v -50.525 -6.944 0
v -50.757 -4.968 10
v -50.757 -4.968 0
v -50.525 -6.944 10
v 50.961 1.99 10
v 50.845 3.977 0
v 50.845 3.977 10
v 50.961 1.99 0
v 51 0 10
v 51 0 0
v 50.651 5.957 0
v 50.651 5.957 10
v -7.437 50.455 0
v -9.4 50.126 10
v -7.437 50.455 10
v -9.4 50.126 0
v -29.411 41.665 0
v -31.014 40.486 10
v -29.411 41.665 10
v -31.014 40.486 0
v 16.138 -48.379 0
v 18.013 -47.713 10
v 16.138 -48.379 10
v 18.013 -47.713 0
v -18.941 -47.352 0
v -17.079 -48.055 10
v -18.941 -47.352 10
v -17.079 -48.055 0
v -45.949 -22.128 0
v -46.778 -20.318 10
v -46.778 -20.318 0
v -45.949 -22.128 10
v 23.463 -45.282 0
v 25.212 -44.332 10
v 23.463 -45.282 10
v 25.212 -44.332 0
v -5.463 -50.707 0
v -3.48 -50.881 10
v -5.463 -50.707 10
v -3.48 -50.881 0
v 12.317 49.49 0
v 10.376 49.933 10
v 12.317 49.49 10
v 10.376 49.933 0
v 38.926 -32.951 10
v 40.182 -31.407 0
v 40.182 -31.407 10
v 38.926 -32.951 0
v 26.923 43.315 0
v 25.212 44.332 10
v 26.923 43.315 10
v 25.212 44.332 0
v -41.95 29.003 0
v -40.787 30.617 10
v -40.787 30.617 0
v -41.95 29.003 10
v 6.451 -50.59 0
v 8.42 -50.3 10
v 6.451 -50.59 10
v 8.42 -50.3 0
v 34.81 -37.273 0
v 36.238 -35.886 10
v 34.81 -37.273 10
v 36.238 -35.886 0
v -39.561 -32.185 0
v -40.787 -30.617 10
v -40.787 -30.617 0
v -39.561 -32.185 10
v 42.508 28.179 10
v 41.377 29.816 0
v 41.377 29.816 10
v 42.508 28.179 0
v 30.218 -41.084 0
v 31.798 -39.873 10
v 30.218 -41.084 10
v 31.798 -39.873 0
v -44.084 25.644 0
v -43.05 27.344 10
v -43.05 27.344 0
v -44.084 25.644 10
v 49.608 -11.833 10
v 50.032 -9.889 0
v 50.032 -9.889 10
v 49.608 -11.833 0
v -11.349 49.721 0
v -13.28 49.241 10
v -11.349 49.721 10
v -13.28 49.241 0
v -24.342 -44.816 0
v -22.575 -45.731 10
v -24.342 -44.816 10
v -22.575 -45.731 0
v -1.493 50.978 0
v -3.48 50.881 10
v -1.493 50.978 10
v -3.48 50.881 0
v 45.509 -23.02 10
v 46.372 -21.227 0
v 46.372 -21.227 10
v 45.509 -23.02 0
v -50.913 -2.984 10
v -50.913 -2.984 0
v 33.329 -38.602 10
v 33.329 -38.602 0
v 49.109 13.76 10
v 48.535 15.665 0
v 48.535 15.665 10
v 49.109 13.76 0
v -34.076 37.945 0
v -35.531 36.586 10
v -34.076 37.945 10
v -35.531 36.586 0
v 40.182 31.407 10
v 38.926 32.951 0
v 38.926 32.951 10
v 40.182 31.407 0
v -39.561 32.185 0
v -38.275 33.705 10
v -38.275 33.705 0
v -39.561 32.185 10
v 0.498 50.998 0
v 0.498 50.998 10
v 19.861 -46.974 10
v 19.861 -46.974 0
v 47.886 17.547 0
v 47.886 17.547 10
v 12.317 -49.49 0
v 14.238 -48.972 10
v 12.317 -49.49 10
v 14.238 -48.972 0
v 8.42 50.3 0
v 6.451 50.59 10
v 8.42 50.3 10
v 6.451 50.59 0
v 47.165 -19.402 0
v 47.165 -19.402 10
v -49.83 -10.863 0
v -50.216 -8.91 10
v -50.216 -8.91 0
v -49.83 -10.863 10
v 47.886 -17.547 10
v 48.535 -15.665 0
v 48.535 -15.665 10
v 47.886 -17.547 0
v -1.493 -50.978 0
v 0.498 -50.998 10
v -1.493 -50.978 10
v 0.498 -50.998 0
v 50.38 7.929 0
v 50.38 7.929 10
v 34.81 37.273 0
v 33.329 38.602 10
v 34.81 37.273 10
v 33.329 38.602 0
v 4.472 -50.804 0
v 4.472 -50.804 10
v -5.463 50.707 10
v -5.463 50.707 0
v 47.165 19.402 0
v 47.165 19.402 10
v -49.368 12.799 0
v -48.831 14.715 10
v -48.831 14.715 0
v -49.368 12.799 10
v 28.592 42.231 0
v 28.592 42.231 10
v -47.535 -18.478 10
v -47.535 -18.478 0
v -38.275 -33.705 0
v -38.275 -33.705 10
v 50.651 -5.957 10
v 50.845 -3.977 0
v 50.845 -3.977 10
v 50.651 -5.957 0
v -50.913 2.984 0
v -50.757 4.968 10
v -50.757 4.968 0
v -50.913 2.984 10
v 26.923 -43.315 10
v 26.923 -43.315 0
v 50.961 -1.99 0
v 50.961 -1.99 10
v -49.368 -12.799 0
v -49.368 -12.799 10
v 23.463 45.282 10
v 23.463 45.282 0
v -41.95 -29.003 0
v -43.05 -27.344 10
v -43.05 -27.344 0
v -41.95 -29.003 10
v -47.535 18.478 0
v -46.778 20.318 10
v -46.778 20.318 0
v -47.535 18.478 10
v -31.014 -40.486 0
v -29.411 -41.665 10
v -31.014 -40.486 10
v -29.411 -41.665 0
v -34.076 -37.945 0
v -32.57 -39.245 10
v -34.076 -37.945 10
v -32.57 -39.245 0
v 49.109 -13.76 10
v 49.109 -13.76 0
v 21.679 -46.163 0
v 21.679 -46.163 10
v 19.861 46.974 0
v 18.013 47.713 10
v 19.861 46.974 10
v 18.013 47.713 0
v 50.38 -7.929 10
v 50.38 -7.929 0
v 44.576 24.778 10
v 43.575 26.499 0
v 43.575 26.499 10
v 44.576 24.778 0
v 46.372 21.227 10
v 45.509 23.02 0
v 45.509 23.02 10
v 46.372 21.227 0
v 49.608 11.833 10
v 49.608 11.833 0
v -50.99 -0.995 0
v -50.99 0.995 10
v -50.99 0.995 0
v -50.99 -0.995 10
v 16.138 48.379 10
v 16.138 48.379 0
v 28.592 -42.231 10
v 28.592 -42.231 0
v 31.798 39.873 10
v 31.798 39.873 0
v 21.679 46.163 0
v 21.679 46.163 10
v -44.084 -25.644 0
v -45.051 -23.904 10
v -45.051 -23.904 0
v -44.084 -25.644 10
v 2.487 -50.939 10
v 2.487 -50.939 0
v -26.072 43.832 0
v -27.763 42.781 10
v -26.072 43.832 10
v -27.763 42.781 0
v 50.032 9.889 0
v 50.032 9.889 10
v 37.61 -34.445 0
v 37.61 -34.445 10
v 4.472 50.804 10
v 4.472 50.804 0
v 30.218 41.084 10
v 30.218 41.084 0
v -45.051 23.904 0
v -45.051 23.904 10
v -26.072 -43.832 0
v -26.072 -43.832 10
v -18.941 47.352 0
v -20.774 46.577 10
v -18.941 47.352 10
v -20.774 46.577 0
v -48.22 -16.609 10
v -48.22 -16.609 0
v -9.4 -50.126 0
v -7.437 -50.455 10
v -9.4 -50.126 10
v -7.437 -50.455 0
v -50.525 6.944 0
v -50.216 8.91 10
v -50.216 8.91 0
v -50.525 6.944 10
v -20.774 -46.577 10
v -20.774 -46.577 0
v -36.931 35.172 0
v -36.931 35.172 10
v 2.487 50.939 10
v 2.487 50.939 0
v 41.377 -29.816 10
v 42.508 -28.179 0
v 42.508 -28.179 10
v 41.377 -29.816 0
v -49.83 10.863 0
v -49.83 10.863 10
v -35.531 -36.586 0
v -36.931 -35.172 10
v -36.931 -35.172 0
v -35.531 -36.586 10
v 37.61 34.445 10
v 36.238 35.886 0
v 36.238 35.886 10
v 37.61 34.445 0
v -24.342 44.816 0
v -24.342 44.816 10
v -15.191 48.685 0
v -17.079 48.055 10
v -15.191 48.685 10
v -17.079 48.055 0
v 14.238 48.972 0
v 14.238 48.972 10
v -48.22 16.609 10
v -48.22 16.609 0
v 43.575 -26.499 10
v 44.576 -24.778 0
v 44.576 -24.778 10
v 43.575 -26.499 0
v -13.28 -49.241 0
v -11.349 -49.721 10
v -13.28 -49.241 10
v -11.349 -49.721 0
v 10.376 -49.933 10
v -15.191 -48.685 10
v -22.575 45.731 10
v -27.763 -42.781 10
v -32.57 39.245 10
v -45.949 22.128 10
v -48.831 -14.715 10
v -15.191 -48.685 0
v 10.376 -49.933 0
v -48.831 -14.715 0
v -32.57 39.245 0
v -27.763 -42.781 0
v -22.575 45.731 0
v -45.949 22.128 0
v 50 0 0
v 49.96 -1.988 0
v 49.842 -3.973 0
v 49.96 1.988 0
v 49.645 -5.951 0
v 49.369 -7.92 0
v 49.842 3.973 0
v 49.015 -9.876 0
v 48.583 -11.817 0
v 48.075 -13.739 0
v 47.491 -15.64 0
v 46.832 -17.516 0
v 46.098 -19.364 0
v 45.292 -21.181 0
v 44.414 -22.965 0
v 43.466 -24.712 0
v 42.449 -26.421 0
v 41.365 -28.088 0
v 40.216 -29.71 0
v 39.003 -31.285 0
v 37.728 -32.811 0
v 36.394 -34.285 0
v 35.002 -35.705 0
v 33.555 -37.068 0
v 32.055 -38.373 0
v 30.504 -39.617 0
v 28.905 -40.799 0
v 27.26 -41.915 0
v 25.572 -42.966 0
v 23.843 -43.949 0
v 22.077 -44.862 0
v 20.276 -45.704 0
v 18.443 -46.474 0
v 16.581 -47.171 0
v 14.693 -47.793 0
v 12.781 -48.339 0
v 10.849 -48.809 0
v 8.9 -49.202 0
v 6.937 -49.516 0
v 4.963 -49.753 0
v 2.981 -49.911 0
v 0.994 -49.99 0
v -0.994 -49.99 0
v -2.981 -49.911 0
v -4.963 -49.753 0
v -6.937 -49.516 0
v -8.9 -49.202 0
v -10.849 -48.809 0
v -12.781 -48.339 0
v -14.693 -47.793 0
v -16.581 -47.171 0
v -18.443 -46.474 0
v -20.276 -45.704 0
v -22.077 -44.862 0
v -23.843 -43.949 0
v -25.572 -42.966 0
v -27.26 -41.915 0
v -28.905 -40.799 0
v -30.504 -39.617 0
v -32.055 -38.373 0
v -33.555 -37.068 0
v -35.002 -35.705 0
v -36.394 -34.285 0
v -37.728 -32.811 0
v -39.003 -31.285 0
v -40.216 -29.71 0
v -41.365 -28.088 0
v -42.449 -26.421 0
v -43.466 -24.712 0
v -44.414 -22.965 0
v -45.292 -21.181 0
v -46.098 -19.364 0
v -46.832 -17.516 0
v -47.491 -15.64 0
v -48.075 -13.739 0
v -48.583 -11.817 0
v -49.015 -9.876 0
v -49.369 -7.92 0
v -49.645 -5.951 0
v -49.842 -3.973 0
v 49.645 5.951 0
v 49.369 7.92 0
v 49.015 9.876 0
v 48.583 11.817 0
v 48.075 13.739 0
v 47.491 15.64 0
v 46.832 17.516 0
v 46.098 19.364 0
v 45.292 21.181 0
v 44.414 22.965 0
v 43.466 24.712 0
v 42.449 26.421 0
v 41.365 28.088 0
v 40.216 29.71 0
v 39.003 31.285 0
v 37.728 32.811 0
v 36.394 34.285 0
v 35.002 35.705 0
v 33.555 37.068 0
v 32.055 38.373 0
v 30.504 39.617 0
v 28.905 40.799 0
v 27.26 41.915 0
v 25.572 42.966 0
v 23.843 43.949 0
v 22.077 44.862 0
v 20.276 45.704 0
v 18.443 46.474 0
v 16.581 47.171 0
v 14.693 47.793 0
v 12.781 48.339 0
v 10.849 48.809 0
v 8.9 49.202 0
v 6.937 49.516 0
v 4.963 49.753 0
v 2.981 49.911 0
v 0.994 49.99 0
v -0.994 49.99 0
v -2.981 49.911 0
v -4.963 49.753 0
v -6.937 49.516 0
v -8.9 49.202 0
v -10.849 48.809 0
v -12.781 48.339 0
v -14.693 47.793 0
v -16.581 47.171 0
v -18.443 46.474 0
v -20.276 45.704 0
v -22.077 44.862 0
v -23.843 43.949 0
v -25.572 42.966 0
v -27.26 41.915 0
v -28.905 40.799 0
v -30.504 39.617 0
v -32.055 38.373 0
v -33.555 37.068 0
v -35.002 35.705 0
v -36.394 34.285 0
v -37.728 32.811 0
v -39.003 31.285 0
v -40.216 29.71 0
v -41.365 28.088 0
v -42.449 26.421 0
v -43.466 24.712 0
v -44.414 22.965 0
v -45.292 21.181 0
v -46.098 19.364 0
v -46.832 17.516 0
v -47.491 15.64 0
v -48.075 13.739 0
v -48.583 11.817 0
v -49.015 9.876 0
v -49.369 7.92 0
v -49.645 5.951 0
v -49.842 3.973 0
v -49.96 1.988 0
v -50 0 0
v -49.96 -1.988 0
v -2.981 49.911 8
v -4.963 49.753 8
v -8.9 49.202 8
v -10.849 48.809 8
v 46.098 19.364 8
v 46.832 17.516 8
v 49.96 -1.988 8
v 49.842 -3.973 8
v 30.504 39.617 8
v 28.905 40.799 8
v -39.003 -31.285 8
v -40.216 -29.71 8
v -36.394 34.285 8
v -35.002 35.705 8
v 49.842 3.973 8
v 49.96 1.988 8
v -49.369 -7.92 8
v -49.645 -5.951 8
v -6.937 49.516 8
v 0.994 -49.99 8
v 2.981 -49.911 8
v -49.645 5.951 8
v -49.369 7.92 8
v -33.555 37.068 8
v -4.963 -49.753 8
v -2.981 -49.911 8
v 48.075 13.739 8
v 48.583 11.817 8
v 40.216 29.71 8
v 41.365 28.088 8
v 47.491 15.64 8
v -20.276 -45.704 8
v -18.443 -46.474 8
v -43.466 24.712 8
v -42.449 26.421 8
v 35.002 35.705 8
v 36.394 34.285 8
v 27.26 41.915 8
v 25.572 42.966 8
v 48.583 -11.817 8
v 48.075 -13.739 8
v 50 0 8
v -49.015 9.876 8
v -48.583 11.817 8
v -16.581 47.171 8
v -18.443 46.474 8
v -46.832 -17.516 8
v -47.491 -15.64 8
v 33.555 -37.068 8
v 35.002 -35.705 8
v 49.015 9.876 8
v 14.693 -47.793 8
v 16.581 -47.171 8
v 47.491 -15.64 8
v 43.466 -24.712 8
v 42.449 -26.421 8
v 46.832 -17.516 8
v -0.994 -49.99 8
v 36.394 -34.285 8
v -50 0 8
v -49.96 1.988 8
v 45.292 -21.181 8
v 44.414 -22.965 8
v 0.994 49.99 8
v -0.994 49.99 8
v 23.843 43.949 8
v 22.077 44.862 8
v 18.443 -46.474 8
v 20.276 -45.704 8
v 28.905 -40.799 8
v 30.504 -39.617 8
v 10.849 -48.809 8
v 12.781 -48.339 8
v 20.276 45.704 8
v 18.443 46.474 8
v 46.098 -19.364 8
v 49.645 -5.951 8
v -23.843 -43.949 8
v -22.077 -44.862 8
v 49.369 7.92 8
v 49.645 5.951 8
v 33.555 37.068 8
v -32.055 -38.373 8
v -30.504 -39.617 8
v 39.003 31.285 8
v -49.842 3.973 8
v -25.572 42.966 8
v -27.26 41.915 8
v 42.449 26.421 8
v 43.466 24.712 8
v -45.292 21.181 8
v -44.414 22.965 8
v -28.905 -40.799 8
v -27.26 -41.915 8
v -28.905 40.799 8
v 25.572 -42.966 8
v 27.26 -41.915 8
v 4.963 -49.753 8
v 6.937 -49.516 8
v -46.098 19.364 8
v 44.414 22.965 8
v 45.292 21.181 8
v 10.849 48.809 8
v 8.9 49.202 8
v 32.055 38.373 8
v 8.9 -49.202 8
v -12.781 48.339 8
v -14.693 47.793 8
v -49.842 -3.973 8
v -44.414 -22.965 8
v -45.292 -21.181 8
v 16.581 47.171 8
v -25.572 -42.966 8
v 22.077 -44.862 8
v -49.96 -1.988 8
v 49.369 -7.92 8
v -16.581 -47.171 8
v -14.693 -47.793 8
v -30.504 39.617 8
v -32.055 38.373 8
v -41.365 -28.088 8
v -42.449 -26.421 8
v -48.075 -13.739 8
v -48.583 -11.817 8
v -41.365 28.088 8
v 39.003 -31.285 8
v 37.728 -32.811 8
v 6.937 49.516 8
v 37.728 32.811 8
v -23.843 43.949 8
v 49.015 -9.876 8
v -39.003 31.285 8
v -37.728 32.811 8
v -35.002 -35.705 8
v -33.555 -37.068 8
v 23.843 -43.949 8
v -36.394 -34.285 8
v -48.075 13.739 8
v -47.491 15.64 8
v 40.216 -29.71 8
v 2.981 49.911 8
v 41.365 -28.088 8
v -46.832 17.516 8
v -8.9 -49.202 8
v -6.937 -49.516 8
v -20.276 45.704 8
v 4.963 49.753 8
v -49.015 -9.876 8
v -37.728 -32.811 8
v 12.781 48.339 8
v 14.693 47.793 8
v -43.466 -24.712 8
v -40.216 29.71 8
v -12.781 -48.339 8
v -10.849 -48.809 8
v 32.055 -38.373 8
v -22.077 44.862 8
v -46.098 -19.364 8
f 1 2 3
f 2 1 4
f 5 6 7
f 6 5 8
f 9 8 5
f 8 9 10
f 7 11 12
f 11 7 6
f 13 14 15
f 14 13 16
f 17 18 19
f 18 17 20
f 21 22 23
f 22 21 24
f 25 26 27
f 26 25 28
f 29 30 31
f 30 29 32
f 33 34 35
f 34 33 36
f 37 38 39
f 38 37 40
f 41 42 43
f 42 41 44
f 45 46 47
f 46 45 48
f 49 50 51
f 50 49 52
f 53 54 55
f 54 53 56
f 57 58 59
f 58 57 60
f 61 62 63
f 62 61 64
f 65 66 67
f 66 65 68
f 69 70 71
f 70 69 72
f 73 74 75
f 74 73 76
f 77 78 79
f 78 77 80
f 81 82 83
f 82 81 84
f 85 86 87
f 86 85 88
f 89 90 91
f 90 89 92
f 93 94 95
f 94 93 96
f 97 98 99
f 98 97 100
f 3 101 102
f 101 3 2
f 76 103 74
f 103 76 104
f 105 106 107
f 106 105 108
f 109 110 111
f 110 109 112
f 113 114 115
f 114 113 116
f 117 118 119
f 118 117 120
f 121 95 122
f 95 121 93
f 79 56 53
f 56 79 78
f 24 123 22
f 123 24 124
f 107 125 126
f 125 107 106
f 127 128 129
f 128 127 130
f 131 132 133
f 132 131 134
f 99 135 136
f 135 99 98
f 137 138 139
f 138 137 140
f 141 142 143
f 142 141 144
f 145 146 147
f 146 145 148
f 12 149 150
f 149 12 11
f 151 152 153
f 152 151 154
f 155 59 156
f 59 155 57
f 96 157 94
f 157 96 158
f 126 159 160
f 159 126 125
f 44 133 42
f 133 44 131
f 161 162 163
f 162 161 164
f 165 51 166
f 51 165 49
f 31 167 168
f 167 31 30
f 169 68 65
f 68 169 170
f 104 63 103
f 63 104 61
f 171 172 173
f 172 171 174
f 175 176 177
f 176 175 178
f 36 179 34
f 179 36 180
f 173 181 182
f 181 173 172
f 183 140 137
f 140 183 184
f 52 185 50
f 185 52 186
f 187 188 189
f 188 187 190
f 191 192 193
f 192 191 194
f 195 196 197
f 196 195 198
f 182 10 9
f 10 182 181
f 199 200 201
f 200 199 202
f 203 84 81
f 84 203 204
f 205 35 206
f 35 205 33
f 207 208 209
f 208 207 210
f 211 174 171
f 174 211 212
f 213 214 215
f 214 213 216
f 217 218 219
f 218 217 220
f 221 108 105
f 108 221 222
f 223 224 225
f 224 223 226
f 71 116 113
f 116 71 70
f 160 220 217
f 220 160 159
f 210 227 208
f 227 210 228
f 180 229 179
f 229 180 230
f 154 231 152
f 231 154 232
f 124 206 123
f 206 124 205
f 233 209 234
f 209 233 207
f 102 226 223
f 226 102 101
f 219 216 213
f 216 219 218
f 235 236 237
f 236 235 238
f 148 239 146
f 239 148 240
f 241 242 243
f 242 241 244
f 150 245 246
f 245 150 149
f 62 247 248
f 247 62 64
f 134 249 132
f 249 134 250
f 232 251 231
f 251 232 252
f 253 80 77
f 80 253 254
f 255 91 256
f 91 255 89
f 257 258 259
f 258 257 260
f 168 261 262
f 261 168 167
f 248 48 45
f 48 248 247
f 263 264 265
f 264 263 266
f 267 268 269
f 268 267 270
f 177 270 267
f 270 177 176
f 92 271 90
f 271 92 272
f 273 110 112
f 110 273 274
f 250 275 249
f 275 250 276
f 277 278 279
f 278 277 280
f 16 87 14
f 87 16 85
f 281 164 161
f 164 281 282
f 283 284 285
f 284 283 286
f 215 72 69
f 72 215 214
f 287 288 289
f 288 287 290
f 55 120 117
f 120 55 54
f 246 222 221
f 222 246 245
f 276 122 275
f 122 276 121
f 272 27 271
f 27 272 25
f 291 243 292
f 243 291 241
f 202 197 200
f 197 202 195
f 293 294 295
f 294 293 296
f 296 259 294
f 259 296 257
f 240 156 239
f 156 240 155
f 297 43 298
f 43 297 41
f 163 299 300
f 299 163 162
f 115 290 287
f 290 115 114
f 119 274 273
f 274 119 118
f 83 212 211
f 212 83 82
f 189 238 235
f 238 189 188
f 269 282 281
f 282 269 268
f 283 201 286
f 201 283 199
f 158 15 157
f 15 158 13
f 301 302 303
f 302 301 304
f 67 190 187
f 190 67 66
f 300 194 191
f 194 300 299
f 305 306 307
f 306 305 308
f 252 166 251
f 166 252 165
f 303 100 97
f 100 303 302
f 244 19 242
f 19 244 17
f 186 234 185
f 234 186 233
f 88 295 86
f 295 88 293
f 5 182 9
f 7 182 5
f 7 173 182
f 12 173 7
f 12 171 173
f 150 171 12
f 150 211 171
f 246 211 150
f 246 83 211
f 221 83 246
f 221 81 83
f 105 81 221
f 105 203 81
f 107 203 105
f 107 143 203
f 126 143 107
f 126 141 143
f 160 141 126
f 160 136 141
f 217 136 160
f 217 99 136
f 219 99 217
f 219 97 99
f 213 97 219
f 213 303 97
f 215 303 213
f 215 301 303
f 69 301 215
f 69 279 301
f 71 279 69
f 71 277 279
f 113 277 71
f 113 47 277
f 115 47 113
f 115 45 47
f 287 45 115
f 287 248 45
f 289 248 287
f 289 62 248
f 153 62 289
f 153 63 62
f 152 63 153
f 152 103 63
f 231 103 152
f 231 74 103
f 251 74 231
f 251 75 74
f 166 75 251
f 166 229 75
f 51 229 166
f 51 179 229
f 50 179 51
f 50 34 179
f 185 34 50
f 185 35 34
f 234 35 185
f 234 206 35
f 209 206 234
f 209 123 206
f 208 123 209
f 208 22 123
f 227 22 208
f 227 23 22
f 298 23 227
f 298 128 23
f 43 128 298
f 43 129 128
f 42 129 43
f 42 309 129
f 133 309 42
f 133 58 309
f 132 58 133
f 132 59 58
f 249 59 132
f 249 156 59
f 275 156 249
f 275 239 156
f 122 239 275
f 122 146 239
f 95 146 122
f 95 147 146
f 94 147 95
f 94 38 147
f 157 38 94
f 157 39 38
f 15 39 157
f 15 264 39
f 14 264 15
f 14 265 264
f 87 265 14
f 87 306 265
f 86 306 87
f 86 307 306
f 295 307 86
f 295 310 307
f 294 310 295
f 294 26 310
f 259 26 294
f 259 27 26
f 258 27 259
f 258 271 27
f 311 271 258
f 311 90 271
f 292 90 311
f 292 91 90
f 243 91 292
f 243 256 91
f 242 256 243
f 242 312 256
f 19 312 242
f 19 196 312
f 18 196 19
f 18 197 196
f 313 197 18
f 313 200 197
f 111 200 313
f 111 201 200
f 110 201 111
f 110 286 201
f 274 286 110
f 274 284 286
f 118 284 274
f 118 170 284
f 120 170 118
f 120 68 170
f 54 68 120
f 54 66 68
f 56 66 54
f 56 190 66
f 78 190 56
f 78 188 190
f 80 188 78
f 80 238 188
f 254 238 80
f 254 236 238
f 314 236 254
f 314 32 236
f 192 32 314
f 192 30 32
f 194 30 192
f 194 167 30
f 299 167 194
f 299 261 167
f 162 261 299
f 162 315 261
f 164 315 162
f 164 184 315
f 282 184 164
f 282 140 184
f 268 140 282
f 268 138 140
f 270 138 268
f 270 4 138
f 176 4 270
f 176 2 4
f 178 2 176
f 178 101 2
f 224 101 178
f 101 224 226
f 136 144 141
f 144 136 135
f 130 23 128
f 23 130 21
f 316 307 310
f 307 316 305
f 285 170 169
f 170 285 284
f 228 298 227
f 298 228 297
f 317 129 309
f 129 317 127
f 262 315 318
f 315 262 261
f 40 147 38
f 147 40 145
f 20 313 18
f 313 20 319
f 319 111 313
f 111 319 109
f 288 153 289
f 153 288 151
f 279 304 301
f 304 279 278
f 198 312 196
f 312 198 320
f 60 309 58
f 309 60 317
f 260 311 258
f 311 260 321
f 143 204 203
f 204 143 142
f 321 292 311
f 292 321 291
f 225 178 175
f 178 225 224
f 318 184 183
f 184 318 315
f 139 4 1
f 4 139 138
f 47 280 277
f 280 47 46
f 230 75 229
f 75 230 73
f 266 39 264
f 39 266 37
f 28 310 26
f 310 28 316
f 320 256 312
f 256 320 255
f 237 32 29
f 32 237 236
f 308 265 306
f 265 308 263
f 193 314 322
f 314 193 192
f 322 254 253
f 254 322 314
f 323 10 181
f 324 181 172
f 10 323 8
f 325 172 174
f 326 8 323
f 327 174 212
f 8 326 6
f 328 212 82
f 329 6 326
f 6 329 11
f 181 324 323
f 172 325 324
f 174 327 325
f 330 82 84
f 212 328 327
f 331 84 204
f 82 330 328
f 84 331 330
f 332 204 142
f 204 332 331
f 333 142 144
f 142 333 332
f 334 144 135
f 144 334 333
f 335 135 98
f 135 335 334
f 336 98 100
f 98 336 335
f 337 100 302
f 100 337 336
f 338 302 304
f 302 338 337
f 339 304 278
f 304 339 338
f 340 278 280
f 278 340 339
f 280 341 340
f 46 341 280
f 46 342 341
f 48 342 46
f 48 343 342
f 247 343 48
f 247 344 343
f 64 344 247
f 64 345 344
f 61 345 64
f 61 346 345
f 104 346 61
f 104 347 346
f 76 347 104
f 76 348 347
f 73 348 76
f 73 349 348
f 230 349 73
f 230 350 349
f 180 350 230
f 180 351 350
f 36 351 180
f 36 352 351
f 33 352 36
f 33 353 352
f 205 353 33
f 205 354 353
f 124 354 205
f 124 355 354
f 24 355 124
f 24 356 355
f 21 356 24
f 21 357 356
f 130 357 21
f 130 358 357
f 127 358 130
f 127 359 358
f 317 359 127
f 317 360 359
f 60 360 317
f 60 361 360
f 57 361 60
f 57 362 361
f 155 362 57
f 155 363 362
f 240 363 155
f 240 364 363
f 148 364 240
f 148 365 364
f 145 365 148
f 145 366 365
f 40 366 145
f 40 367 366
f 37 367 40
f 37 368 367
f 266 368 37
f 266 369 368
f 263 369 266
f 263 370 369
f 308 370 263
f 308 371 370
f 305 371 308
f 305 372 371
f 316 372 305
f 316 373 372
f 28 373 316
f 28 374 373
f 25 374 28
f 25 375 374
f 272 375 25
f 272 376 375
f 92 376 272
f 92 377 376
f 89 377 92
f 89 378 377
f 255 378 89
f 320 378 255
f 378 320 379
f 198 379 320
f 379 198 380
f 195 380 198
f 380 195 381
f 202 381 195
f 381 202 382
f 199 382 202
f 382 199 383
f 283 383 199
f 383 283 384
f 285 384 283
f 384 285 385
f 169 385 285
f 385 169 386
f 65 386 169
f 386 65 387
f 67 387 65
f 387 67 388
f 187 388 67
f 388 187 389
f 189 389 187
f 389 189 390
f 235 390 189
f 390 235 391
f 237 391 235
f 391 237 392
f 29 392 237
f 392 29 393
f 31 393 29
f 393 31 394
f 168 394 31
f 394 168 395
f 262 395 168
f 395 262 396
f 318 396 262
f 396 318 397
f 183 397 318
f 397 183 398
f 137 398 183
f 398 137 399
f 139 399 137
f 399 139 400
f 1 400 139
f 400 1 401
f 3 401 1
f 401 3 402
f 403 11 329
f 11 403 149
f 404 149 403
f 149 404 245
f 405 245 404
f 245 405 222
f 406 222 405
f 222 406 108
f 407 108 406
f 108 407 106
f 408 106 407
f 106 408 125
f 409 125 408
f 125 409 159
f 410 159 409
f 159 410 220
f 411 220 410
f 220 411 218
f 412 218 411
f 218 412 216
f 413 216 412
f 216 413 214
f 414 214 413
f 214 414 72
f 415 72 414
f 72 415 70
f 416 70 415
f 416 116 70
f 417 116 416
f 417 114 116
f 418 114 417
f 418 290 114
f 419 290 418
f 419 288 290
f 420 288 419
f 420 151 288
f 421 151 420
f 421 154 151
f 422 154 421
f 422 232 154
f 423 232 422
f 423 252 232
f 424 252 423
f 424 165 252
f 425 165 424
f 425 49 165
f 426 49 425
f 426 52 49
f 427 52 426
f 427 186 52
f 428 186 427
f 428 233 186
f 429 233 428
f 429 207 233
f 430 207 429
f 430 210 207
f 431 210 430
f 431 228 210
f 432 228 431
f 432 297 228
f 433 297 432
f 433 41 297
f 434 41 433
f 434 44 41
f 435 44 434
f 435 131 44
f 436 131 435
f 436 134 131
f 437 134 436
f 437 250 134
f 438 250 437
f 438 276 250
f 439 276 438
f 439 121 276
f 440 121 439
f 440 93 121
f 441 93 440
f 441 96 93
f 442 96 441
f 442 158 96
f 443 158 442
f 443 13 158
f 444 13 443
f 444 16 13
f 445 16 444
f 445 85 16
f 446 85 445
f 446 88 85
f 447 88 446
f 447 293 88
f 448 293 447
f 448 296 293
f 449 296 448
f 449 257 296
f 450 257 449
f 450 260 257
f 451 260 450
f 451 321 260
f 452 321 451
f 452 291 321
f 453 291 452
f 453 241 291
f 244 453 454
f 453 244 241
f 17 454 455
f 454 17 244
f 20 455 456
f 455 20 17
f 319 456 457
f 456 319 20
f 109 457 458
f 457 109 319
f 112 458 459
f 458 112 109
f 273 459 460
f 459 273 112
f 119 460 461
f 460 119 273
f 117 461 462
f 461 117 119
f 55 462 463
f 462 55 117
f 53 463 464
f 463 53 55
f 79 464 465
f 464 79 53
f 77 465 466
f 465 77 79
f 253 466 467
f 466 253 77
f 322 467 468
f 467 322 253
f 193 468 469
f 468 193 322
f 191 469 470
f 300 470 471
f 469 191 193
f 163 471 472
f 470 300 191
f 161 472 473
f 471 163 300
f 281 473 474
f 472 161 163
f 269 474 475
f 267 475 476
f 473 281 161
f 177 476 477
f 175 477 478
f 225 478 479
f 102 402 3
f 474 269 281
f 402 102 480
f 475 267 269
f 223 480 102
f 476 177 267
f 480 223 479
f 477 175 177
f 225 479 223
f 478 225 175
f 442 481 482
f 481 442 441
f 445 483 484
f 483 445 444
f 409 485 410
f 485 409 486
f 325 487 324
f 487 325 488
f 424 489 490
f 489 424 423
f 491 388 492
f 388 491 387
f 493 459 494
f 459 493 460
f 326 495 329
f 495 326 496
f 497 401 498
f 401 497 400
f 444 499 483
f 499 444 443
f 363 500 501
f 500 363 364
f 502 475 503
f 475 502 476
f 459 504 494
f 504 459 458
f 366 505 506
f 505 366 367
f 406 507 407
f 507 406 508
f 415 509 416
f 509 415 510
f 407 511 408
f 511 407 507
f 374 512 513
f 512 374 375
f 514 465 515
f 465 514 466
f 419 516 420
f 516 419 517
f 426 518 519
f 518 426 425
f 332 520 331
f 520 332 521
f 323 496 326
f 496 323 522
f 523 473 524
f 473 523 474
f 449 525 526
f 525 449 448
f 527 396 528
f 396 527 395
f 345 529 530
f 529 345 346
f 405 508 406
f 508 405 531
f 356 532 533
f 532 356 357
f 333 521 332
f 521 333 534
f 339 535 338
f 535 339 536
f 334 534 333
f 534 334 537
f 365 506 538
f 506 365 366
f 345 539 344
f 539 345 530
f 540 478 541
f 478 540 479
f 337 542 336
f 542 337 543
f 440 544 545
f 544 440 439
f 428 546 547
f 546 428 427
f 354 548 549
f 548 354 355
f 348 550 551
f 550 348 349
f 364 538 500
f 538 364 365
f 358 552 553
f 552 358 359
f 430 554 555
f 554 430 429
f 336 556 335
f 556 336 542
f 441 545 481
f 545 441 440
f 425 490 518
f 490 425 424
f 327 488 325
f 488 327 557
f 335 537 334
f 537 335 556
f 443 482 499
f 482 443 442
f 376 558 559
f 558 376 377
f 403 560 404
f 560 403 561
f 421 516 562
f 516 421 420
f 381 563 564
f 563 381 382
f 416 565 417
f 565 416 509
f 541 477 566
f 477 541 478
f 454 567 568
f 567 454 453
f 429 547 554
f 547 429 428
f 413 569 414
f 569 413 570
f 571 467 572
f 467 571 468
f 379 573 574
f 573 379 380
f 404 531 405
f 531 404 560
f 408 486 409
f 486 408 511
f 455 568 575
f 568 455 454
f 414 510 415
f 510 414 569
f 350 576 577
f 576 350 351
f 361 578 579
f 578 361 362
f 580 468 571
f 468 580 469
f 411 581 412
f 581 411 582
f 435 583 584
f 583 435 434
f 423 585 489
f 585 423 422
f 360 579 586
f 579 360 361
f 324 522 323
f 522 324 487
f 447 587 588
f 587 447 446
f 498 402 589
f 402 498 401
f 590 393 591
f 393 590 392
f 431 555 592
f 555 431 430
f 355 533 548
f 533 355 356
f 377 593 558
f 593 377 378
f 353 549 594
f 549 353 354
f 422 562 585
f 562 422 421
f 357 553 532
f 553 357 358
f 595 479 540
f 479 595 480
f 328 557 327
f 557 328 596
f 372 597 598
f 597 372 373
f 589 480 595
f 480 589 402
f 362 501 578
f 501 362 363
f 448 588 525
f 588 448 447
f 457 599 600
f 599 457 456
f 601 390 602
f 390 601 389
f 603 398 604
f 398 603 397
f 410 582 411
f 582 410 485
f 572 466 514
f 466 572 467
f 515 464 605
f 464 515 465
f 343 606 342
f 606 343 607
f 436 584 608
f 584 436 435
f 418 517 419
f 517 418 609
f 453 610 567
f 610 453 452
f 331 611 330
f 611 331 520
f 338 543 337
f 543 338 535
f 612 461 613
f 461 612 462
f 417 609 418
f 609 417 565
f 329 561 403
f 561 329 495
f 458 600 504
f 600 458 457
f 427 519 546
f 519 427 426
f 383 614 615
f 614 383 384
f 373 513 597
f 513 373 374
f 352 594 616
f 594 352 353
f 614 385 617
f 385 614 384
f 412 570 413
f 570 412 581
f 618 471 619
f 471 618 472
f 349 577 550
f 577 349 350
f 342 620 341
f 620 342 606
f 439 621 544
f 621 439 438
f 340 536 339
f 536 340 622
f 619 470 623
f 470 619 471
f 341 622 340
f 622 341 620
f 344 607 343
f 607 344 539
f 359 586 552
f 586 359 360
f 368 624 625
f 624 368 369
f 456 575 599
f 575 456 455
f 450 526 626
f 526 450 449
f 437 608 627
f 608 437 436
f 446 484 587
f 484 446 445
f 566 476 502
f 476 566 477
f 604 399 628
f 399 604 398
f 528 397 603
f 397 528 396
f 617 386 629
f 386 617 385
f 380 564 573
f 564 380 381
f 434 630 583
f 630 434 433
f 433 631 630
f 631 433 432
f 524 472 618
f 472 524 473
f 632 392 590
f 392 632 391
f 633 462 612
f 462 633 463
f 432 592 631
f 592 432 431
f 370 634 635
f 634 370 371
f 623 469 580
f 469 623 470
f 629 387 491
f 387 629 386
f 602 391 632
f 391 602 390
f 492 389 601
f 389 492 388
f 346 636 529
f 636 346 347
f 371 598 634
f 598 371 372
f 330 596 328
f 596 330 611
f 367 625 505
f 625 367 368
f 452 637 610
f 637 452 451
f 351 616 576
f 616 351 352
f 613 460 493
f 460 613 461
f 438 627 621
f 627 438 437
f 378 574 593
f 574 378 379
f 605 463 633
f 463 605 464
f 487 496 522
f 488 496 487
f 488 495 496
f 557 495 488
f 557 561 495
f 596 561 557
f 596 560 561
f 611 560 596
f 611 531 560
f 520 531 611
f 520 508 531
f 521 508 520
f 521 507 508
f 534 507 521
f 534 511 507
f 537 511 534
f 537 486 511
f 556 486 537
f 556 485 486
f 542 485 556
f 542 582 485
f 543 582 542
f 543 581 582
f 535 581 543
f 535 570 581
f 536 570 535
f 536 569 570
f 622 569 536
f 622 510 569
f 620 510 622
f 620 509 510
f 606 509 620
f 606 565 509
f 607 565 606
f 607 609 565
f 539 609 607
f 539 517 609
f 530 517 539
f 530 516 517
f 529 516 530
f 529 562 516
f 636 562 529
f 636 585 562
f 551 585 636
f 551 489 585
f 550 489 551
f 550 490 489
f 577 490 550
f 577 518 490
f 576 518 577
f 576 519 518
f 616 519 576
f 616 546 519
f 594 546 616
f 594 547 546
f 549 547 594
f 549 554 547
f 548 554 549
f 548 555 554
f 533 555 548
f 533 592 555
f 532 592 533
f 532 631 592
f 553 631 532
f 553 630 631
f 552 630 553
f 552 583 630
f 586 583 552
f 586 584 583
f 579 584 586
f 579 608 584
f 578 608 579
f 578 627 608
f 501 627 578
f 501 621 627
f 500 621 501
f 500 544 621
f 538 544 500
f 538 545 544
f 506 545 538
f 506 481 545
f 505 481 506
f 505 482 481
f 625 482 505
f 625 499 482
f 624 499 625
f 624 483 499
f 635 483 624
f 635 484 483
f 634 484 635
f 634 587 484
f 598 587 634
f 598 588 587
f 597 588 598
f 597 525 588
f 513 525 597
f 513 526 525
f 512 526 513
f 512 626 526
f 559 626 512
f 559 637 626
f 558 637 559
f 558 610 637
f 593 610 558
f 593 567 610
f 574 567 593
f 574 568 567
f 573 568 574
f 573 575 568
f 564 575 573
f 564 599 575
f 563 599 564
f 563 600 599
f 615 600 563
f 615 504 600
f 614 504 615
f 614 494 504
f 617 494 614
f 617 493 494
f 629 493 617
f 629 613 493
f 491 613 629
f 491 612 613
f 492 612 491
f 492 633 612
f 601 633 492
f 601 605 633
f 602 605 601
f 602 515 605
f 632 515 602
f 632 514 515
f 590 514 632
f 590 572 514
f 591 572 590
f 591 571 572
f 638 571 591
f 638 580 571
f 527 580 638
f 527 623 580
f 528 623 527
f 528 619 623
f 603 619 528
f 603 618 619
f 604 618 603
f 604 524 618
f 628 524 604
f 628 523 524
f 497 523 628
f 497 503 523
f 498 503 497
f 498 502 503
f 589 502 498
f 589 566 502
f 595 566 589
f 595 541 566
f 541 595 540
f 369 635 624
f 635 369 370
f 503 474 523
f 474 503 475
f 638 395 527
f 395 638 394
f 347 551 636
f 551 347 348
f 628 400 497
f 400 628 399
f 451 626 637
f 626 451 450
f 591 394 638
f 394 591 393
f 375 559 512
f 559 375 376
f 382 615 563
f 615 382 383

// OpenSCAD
$fa=1;
thickness=2;
outer_diameter=100;

difference() {
	cylinder(h=10,d=outer_diameter+thickness);
	cylinder(h=8,d=outer_diameter);
}
